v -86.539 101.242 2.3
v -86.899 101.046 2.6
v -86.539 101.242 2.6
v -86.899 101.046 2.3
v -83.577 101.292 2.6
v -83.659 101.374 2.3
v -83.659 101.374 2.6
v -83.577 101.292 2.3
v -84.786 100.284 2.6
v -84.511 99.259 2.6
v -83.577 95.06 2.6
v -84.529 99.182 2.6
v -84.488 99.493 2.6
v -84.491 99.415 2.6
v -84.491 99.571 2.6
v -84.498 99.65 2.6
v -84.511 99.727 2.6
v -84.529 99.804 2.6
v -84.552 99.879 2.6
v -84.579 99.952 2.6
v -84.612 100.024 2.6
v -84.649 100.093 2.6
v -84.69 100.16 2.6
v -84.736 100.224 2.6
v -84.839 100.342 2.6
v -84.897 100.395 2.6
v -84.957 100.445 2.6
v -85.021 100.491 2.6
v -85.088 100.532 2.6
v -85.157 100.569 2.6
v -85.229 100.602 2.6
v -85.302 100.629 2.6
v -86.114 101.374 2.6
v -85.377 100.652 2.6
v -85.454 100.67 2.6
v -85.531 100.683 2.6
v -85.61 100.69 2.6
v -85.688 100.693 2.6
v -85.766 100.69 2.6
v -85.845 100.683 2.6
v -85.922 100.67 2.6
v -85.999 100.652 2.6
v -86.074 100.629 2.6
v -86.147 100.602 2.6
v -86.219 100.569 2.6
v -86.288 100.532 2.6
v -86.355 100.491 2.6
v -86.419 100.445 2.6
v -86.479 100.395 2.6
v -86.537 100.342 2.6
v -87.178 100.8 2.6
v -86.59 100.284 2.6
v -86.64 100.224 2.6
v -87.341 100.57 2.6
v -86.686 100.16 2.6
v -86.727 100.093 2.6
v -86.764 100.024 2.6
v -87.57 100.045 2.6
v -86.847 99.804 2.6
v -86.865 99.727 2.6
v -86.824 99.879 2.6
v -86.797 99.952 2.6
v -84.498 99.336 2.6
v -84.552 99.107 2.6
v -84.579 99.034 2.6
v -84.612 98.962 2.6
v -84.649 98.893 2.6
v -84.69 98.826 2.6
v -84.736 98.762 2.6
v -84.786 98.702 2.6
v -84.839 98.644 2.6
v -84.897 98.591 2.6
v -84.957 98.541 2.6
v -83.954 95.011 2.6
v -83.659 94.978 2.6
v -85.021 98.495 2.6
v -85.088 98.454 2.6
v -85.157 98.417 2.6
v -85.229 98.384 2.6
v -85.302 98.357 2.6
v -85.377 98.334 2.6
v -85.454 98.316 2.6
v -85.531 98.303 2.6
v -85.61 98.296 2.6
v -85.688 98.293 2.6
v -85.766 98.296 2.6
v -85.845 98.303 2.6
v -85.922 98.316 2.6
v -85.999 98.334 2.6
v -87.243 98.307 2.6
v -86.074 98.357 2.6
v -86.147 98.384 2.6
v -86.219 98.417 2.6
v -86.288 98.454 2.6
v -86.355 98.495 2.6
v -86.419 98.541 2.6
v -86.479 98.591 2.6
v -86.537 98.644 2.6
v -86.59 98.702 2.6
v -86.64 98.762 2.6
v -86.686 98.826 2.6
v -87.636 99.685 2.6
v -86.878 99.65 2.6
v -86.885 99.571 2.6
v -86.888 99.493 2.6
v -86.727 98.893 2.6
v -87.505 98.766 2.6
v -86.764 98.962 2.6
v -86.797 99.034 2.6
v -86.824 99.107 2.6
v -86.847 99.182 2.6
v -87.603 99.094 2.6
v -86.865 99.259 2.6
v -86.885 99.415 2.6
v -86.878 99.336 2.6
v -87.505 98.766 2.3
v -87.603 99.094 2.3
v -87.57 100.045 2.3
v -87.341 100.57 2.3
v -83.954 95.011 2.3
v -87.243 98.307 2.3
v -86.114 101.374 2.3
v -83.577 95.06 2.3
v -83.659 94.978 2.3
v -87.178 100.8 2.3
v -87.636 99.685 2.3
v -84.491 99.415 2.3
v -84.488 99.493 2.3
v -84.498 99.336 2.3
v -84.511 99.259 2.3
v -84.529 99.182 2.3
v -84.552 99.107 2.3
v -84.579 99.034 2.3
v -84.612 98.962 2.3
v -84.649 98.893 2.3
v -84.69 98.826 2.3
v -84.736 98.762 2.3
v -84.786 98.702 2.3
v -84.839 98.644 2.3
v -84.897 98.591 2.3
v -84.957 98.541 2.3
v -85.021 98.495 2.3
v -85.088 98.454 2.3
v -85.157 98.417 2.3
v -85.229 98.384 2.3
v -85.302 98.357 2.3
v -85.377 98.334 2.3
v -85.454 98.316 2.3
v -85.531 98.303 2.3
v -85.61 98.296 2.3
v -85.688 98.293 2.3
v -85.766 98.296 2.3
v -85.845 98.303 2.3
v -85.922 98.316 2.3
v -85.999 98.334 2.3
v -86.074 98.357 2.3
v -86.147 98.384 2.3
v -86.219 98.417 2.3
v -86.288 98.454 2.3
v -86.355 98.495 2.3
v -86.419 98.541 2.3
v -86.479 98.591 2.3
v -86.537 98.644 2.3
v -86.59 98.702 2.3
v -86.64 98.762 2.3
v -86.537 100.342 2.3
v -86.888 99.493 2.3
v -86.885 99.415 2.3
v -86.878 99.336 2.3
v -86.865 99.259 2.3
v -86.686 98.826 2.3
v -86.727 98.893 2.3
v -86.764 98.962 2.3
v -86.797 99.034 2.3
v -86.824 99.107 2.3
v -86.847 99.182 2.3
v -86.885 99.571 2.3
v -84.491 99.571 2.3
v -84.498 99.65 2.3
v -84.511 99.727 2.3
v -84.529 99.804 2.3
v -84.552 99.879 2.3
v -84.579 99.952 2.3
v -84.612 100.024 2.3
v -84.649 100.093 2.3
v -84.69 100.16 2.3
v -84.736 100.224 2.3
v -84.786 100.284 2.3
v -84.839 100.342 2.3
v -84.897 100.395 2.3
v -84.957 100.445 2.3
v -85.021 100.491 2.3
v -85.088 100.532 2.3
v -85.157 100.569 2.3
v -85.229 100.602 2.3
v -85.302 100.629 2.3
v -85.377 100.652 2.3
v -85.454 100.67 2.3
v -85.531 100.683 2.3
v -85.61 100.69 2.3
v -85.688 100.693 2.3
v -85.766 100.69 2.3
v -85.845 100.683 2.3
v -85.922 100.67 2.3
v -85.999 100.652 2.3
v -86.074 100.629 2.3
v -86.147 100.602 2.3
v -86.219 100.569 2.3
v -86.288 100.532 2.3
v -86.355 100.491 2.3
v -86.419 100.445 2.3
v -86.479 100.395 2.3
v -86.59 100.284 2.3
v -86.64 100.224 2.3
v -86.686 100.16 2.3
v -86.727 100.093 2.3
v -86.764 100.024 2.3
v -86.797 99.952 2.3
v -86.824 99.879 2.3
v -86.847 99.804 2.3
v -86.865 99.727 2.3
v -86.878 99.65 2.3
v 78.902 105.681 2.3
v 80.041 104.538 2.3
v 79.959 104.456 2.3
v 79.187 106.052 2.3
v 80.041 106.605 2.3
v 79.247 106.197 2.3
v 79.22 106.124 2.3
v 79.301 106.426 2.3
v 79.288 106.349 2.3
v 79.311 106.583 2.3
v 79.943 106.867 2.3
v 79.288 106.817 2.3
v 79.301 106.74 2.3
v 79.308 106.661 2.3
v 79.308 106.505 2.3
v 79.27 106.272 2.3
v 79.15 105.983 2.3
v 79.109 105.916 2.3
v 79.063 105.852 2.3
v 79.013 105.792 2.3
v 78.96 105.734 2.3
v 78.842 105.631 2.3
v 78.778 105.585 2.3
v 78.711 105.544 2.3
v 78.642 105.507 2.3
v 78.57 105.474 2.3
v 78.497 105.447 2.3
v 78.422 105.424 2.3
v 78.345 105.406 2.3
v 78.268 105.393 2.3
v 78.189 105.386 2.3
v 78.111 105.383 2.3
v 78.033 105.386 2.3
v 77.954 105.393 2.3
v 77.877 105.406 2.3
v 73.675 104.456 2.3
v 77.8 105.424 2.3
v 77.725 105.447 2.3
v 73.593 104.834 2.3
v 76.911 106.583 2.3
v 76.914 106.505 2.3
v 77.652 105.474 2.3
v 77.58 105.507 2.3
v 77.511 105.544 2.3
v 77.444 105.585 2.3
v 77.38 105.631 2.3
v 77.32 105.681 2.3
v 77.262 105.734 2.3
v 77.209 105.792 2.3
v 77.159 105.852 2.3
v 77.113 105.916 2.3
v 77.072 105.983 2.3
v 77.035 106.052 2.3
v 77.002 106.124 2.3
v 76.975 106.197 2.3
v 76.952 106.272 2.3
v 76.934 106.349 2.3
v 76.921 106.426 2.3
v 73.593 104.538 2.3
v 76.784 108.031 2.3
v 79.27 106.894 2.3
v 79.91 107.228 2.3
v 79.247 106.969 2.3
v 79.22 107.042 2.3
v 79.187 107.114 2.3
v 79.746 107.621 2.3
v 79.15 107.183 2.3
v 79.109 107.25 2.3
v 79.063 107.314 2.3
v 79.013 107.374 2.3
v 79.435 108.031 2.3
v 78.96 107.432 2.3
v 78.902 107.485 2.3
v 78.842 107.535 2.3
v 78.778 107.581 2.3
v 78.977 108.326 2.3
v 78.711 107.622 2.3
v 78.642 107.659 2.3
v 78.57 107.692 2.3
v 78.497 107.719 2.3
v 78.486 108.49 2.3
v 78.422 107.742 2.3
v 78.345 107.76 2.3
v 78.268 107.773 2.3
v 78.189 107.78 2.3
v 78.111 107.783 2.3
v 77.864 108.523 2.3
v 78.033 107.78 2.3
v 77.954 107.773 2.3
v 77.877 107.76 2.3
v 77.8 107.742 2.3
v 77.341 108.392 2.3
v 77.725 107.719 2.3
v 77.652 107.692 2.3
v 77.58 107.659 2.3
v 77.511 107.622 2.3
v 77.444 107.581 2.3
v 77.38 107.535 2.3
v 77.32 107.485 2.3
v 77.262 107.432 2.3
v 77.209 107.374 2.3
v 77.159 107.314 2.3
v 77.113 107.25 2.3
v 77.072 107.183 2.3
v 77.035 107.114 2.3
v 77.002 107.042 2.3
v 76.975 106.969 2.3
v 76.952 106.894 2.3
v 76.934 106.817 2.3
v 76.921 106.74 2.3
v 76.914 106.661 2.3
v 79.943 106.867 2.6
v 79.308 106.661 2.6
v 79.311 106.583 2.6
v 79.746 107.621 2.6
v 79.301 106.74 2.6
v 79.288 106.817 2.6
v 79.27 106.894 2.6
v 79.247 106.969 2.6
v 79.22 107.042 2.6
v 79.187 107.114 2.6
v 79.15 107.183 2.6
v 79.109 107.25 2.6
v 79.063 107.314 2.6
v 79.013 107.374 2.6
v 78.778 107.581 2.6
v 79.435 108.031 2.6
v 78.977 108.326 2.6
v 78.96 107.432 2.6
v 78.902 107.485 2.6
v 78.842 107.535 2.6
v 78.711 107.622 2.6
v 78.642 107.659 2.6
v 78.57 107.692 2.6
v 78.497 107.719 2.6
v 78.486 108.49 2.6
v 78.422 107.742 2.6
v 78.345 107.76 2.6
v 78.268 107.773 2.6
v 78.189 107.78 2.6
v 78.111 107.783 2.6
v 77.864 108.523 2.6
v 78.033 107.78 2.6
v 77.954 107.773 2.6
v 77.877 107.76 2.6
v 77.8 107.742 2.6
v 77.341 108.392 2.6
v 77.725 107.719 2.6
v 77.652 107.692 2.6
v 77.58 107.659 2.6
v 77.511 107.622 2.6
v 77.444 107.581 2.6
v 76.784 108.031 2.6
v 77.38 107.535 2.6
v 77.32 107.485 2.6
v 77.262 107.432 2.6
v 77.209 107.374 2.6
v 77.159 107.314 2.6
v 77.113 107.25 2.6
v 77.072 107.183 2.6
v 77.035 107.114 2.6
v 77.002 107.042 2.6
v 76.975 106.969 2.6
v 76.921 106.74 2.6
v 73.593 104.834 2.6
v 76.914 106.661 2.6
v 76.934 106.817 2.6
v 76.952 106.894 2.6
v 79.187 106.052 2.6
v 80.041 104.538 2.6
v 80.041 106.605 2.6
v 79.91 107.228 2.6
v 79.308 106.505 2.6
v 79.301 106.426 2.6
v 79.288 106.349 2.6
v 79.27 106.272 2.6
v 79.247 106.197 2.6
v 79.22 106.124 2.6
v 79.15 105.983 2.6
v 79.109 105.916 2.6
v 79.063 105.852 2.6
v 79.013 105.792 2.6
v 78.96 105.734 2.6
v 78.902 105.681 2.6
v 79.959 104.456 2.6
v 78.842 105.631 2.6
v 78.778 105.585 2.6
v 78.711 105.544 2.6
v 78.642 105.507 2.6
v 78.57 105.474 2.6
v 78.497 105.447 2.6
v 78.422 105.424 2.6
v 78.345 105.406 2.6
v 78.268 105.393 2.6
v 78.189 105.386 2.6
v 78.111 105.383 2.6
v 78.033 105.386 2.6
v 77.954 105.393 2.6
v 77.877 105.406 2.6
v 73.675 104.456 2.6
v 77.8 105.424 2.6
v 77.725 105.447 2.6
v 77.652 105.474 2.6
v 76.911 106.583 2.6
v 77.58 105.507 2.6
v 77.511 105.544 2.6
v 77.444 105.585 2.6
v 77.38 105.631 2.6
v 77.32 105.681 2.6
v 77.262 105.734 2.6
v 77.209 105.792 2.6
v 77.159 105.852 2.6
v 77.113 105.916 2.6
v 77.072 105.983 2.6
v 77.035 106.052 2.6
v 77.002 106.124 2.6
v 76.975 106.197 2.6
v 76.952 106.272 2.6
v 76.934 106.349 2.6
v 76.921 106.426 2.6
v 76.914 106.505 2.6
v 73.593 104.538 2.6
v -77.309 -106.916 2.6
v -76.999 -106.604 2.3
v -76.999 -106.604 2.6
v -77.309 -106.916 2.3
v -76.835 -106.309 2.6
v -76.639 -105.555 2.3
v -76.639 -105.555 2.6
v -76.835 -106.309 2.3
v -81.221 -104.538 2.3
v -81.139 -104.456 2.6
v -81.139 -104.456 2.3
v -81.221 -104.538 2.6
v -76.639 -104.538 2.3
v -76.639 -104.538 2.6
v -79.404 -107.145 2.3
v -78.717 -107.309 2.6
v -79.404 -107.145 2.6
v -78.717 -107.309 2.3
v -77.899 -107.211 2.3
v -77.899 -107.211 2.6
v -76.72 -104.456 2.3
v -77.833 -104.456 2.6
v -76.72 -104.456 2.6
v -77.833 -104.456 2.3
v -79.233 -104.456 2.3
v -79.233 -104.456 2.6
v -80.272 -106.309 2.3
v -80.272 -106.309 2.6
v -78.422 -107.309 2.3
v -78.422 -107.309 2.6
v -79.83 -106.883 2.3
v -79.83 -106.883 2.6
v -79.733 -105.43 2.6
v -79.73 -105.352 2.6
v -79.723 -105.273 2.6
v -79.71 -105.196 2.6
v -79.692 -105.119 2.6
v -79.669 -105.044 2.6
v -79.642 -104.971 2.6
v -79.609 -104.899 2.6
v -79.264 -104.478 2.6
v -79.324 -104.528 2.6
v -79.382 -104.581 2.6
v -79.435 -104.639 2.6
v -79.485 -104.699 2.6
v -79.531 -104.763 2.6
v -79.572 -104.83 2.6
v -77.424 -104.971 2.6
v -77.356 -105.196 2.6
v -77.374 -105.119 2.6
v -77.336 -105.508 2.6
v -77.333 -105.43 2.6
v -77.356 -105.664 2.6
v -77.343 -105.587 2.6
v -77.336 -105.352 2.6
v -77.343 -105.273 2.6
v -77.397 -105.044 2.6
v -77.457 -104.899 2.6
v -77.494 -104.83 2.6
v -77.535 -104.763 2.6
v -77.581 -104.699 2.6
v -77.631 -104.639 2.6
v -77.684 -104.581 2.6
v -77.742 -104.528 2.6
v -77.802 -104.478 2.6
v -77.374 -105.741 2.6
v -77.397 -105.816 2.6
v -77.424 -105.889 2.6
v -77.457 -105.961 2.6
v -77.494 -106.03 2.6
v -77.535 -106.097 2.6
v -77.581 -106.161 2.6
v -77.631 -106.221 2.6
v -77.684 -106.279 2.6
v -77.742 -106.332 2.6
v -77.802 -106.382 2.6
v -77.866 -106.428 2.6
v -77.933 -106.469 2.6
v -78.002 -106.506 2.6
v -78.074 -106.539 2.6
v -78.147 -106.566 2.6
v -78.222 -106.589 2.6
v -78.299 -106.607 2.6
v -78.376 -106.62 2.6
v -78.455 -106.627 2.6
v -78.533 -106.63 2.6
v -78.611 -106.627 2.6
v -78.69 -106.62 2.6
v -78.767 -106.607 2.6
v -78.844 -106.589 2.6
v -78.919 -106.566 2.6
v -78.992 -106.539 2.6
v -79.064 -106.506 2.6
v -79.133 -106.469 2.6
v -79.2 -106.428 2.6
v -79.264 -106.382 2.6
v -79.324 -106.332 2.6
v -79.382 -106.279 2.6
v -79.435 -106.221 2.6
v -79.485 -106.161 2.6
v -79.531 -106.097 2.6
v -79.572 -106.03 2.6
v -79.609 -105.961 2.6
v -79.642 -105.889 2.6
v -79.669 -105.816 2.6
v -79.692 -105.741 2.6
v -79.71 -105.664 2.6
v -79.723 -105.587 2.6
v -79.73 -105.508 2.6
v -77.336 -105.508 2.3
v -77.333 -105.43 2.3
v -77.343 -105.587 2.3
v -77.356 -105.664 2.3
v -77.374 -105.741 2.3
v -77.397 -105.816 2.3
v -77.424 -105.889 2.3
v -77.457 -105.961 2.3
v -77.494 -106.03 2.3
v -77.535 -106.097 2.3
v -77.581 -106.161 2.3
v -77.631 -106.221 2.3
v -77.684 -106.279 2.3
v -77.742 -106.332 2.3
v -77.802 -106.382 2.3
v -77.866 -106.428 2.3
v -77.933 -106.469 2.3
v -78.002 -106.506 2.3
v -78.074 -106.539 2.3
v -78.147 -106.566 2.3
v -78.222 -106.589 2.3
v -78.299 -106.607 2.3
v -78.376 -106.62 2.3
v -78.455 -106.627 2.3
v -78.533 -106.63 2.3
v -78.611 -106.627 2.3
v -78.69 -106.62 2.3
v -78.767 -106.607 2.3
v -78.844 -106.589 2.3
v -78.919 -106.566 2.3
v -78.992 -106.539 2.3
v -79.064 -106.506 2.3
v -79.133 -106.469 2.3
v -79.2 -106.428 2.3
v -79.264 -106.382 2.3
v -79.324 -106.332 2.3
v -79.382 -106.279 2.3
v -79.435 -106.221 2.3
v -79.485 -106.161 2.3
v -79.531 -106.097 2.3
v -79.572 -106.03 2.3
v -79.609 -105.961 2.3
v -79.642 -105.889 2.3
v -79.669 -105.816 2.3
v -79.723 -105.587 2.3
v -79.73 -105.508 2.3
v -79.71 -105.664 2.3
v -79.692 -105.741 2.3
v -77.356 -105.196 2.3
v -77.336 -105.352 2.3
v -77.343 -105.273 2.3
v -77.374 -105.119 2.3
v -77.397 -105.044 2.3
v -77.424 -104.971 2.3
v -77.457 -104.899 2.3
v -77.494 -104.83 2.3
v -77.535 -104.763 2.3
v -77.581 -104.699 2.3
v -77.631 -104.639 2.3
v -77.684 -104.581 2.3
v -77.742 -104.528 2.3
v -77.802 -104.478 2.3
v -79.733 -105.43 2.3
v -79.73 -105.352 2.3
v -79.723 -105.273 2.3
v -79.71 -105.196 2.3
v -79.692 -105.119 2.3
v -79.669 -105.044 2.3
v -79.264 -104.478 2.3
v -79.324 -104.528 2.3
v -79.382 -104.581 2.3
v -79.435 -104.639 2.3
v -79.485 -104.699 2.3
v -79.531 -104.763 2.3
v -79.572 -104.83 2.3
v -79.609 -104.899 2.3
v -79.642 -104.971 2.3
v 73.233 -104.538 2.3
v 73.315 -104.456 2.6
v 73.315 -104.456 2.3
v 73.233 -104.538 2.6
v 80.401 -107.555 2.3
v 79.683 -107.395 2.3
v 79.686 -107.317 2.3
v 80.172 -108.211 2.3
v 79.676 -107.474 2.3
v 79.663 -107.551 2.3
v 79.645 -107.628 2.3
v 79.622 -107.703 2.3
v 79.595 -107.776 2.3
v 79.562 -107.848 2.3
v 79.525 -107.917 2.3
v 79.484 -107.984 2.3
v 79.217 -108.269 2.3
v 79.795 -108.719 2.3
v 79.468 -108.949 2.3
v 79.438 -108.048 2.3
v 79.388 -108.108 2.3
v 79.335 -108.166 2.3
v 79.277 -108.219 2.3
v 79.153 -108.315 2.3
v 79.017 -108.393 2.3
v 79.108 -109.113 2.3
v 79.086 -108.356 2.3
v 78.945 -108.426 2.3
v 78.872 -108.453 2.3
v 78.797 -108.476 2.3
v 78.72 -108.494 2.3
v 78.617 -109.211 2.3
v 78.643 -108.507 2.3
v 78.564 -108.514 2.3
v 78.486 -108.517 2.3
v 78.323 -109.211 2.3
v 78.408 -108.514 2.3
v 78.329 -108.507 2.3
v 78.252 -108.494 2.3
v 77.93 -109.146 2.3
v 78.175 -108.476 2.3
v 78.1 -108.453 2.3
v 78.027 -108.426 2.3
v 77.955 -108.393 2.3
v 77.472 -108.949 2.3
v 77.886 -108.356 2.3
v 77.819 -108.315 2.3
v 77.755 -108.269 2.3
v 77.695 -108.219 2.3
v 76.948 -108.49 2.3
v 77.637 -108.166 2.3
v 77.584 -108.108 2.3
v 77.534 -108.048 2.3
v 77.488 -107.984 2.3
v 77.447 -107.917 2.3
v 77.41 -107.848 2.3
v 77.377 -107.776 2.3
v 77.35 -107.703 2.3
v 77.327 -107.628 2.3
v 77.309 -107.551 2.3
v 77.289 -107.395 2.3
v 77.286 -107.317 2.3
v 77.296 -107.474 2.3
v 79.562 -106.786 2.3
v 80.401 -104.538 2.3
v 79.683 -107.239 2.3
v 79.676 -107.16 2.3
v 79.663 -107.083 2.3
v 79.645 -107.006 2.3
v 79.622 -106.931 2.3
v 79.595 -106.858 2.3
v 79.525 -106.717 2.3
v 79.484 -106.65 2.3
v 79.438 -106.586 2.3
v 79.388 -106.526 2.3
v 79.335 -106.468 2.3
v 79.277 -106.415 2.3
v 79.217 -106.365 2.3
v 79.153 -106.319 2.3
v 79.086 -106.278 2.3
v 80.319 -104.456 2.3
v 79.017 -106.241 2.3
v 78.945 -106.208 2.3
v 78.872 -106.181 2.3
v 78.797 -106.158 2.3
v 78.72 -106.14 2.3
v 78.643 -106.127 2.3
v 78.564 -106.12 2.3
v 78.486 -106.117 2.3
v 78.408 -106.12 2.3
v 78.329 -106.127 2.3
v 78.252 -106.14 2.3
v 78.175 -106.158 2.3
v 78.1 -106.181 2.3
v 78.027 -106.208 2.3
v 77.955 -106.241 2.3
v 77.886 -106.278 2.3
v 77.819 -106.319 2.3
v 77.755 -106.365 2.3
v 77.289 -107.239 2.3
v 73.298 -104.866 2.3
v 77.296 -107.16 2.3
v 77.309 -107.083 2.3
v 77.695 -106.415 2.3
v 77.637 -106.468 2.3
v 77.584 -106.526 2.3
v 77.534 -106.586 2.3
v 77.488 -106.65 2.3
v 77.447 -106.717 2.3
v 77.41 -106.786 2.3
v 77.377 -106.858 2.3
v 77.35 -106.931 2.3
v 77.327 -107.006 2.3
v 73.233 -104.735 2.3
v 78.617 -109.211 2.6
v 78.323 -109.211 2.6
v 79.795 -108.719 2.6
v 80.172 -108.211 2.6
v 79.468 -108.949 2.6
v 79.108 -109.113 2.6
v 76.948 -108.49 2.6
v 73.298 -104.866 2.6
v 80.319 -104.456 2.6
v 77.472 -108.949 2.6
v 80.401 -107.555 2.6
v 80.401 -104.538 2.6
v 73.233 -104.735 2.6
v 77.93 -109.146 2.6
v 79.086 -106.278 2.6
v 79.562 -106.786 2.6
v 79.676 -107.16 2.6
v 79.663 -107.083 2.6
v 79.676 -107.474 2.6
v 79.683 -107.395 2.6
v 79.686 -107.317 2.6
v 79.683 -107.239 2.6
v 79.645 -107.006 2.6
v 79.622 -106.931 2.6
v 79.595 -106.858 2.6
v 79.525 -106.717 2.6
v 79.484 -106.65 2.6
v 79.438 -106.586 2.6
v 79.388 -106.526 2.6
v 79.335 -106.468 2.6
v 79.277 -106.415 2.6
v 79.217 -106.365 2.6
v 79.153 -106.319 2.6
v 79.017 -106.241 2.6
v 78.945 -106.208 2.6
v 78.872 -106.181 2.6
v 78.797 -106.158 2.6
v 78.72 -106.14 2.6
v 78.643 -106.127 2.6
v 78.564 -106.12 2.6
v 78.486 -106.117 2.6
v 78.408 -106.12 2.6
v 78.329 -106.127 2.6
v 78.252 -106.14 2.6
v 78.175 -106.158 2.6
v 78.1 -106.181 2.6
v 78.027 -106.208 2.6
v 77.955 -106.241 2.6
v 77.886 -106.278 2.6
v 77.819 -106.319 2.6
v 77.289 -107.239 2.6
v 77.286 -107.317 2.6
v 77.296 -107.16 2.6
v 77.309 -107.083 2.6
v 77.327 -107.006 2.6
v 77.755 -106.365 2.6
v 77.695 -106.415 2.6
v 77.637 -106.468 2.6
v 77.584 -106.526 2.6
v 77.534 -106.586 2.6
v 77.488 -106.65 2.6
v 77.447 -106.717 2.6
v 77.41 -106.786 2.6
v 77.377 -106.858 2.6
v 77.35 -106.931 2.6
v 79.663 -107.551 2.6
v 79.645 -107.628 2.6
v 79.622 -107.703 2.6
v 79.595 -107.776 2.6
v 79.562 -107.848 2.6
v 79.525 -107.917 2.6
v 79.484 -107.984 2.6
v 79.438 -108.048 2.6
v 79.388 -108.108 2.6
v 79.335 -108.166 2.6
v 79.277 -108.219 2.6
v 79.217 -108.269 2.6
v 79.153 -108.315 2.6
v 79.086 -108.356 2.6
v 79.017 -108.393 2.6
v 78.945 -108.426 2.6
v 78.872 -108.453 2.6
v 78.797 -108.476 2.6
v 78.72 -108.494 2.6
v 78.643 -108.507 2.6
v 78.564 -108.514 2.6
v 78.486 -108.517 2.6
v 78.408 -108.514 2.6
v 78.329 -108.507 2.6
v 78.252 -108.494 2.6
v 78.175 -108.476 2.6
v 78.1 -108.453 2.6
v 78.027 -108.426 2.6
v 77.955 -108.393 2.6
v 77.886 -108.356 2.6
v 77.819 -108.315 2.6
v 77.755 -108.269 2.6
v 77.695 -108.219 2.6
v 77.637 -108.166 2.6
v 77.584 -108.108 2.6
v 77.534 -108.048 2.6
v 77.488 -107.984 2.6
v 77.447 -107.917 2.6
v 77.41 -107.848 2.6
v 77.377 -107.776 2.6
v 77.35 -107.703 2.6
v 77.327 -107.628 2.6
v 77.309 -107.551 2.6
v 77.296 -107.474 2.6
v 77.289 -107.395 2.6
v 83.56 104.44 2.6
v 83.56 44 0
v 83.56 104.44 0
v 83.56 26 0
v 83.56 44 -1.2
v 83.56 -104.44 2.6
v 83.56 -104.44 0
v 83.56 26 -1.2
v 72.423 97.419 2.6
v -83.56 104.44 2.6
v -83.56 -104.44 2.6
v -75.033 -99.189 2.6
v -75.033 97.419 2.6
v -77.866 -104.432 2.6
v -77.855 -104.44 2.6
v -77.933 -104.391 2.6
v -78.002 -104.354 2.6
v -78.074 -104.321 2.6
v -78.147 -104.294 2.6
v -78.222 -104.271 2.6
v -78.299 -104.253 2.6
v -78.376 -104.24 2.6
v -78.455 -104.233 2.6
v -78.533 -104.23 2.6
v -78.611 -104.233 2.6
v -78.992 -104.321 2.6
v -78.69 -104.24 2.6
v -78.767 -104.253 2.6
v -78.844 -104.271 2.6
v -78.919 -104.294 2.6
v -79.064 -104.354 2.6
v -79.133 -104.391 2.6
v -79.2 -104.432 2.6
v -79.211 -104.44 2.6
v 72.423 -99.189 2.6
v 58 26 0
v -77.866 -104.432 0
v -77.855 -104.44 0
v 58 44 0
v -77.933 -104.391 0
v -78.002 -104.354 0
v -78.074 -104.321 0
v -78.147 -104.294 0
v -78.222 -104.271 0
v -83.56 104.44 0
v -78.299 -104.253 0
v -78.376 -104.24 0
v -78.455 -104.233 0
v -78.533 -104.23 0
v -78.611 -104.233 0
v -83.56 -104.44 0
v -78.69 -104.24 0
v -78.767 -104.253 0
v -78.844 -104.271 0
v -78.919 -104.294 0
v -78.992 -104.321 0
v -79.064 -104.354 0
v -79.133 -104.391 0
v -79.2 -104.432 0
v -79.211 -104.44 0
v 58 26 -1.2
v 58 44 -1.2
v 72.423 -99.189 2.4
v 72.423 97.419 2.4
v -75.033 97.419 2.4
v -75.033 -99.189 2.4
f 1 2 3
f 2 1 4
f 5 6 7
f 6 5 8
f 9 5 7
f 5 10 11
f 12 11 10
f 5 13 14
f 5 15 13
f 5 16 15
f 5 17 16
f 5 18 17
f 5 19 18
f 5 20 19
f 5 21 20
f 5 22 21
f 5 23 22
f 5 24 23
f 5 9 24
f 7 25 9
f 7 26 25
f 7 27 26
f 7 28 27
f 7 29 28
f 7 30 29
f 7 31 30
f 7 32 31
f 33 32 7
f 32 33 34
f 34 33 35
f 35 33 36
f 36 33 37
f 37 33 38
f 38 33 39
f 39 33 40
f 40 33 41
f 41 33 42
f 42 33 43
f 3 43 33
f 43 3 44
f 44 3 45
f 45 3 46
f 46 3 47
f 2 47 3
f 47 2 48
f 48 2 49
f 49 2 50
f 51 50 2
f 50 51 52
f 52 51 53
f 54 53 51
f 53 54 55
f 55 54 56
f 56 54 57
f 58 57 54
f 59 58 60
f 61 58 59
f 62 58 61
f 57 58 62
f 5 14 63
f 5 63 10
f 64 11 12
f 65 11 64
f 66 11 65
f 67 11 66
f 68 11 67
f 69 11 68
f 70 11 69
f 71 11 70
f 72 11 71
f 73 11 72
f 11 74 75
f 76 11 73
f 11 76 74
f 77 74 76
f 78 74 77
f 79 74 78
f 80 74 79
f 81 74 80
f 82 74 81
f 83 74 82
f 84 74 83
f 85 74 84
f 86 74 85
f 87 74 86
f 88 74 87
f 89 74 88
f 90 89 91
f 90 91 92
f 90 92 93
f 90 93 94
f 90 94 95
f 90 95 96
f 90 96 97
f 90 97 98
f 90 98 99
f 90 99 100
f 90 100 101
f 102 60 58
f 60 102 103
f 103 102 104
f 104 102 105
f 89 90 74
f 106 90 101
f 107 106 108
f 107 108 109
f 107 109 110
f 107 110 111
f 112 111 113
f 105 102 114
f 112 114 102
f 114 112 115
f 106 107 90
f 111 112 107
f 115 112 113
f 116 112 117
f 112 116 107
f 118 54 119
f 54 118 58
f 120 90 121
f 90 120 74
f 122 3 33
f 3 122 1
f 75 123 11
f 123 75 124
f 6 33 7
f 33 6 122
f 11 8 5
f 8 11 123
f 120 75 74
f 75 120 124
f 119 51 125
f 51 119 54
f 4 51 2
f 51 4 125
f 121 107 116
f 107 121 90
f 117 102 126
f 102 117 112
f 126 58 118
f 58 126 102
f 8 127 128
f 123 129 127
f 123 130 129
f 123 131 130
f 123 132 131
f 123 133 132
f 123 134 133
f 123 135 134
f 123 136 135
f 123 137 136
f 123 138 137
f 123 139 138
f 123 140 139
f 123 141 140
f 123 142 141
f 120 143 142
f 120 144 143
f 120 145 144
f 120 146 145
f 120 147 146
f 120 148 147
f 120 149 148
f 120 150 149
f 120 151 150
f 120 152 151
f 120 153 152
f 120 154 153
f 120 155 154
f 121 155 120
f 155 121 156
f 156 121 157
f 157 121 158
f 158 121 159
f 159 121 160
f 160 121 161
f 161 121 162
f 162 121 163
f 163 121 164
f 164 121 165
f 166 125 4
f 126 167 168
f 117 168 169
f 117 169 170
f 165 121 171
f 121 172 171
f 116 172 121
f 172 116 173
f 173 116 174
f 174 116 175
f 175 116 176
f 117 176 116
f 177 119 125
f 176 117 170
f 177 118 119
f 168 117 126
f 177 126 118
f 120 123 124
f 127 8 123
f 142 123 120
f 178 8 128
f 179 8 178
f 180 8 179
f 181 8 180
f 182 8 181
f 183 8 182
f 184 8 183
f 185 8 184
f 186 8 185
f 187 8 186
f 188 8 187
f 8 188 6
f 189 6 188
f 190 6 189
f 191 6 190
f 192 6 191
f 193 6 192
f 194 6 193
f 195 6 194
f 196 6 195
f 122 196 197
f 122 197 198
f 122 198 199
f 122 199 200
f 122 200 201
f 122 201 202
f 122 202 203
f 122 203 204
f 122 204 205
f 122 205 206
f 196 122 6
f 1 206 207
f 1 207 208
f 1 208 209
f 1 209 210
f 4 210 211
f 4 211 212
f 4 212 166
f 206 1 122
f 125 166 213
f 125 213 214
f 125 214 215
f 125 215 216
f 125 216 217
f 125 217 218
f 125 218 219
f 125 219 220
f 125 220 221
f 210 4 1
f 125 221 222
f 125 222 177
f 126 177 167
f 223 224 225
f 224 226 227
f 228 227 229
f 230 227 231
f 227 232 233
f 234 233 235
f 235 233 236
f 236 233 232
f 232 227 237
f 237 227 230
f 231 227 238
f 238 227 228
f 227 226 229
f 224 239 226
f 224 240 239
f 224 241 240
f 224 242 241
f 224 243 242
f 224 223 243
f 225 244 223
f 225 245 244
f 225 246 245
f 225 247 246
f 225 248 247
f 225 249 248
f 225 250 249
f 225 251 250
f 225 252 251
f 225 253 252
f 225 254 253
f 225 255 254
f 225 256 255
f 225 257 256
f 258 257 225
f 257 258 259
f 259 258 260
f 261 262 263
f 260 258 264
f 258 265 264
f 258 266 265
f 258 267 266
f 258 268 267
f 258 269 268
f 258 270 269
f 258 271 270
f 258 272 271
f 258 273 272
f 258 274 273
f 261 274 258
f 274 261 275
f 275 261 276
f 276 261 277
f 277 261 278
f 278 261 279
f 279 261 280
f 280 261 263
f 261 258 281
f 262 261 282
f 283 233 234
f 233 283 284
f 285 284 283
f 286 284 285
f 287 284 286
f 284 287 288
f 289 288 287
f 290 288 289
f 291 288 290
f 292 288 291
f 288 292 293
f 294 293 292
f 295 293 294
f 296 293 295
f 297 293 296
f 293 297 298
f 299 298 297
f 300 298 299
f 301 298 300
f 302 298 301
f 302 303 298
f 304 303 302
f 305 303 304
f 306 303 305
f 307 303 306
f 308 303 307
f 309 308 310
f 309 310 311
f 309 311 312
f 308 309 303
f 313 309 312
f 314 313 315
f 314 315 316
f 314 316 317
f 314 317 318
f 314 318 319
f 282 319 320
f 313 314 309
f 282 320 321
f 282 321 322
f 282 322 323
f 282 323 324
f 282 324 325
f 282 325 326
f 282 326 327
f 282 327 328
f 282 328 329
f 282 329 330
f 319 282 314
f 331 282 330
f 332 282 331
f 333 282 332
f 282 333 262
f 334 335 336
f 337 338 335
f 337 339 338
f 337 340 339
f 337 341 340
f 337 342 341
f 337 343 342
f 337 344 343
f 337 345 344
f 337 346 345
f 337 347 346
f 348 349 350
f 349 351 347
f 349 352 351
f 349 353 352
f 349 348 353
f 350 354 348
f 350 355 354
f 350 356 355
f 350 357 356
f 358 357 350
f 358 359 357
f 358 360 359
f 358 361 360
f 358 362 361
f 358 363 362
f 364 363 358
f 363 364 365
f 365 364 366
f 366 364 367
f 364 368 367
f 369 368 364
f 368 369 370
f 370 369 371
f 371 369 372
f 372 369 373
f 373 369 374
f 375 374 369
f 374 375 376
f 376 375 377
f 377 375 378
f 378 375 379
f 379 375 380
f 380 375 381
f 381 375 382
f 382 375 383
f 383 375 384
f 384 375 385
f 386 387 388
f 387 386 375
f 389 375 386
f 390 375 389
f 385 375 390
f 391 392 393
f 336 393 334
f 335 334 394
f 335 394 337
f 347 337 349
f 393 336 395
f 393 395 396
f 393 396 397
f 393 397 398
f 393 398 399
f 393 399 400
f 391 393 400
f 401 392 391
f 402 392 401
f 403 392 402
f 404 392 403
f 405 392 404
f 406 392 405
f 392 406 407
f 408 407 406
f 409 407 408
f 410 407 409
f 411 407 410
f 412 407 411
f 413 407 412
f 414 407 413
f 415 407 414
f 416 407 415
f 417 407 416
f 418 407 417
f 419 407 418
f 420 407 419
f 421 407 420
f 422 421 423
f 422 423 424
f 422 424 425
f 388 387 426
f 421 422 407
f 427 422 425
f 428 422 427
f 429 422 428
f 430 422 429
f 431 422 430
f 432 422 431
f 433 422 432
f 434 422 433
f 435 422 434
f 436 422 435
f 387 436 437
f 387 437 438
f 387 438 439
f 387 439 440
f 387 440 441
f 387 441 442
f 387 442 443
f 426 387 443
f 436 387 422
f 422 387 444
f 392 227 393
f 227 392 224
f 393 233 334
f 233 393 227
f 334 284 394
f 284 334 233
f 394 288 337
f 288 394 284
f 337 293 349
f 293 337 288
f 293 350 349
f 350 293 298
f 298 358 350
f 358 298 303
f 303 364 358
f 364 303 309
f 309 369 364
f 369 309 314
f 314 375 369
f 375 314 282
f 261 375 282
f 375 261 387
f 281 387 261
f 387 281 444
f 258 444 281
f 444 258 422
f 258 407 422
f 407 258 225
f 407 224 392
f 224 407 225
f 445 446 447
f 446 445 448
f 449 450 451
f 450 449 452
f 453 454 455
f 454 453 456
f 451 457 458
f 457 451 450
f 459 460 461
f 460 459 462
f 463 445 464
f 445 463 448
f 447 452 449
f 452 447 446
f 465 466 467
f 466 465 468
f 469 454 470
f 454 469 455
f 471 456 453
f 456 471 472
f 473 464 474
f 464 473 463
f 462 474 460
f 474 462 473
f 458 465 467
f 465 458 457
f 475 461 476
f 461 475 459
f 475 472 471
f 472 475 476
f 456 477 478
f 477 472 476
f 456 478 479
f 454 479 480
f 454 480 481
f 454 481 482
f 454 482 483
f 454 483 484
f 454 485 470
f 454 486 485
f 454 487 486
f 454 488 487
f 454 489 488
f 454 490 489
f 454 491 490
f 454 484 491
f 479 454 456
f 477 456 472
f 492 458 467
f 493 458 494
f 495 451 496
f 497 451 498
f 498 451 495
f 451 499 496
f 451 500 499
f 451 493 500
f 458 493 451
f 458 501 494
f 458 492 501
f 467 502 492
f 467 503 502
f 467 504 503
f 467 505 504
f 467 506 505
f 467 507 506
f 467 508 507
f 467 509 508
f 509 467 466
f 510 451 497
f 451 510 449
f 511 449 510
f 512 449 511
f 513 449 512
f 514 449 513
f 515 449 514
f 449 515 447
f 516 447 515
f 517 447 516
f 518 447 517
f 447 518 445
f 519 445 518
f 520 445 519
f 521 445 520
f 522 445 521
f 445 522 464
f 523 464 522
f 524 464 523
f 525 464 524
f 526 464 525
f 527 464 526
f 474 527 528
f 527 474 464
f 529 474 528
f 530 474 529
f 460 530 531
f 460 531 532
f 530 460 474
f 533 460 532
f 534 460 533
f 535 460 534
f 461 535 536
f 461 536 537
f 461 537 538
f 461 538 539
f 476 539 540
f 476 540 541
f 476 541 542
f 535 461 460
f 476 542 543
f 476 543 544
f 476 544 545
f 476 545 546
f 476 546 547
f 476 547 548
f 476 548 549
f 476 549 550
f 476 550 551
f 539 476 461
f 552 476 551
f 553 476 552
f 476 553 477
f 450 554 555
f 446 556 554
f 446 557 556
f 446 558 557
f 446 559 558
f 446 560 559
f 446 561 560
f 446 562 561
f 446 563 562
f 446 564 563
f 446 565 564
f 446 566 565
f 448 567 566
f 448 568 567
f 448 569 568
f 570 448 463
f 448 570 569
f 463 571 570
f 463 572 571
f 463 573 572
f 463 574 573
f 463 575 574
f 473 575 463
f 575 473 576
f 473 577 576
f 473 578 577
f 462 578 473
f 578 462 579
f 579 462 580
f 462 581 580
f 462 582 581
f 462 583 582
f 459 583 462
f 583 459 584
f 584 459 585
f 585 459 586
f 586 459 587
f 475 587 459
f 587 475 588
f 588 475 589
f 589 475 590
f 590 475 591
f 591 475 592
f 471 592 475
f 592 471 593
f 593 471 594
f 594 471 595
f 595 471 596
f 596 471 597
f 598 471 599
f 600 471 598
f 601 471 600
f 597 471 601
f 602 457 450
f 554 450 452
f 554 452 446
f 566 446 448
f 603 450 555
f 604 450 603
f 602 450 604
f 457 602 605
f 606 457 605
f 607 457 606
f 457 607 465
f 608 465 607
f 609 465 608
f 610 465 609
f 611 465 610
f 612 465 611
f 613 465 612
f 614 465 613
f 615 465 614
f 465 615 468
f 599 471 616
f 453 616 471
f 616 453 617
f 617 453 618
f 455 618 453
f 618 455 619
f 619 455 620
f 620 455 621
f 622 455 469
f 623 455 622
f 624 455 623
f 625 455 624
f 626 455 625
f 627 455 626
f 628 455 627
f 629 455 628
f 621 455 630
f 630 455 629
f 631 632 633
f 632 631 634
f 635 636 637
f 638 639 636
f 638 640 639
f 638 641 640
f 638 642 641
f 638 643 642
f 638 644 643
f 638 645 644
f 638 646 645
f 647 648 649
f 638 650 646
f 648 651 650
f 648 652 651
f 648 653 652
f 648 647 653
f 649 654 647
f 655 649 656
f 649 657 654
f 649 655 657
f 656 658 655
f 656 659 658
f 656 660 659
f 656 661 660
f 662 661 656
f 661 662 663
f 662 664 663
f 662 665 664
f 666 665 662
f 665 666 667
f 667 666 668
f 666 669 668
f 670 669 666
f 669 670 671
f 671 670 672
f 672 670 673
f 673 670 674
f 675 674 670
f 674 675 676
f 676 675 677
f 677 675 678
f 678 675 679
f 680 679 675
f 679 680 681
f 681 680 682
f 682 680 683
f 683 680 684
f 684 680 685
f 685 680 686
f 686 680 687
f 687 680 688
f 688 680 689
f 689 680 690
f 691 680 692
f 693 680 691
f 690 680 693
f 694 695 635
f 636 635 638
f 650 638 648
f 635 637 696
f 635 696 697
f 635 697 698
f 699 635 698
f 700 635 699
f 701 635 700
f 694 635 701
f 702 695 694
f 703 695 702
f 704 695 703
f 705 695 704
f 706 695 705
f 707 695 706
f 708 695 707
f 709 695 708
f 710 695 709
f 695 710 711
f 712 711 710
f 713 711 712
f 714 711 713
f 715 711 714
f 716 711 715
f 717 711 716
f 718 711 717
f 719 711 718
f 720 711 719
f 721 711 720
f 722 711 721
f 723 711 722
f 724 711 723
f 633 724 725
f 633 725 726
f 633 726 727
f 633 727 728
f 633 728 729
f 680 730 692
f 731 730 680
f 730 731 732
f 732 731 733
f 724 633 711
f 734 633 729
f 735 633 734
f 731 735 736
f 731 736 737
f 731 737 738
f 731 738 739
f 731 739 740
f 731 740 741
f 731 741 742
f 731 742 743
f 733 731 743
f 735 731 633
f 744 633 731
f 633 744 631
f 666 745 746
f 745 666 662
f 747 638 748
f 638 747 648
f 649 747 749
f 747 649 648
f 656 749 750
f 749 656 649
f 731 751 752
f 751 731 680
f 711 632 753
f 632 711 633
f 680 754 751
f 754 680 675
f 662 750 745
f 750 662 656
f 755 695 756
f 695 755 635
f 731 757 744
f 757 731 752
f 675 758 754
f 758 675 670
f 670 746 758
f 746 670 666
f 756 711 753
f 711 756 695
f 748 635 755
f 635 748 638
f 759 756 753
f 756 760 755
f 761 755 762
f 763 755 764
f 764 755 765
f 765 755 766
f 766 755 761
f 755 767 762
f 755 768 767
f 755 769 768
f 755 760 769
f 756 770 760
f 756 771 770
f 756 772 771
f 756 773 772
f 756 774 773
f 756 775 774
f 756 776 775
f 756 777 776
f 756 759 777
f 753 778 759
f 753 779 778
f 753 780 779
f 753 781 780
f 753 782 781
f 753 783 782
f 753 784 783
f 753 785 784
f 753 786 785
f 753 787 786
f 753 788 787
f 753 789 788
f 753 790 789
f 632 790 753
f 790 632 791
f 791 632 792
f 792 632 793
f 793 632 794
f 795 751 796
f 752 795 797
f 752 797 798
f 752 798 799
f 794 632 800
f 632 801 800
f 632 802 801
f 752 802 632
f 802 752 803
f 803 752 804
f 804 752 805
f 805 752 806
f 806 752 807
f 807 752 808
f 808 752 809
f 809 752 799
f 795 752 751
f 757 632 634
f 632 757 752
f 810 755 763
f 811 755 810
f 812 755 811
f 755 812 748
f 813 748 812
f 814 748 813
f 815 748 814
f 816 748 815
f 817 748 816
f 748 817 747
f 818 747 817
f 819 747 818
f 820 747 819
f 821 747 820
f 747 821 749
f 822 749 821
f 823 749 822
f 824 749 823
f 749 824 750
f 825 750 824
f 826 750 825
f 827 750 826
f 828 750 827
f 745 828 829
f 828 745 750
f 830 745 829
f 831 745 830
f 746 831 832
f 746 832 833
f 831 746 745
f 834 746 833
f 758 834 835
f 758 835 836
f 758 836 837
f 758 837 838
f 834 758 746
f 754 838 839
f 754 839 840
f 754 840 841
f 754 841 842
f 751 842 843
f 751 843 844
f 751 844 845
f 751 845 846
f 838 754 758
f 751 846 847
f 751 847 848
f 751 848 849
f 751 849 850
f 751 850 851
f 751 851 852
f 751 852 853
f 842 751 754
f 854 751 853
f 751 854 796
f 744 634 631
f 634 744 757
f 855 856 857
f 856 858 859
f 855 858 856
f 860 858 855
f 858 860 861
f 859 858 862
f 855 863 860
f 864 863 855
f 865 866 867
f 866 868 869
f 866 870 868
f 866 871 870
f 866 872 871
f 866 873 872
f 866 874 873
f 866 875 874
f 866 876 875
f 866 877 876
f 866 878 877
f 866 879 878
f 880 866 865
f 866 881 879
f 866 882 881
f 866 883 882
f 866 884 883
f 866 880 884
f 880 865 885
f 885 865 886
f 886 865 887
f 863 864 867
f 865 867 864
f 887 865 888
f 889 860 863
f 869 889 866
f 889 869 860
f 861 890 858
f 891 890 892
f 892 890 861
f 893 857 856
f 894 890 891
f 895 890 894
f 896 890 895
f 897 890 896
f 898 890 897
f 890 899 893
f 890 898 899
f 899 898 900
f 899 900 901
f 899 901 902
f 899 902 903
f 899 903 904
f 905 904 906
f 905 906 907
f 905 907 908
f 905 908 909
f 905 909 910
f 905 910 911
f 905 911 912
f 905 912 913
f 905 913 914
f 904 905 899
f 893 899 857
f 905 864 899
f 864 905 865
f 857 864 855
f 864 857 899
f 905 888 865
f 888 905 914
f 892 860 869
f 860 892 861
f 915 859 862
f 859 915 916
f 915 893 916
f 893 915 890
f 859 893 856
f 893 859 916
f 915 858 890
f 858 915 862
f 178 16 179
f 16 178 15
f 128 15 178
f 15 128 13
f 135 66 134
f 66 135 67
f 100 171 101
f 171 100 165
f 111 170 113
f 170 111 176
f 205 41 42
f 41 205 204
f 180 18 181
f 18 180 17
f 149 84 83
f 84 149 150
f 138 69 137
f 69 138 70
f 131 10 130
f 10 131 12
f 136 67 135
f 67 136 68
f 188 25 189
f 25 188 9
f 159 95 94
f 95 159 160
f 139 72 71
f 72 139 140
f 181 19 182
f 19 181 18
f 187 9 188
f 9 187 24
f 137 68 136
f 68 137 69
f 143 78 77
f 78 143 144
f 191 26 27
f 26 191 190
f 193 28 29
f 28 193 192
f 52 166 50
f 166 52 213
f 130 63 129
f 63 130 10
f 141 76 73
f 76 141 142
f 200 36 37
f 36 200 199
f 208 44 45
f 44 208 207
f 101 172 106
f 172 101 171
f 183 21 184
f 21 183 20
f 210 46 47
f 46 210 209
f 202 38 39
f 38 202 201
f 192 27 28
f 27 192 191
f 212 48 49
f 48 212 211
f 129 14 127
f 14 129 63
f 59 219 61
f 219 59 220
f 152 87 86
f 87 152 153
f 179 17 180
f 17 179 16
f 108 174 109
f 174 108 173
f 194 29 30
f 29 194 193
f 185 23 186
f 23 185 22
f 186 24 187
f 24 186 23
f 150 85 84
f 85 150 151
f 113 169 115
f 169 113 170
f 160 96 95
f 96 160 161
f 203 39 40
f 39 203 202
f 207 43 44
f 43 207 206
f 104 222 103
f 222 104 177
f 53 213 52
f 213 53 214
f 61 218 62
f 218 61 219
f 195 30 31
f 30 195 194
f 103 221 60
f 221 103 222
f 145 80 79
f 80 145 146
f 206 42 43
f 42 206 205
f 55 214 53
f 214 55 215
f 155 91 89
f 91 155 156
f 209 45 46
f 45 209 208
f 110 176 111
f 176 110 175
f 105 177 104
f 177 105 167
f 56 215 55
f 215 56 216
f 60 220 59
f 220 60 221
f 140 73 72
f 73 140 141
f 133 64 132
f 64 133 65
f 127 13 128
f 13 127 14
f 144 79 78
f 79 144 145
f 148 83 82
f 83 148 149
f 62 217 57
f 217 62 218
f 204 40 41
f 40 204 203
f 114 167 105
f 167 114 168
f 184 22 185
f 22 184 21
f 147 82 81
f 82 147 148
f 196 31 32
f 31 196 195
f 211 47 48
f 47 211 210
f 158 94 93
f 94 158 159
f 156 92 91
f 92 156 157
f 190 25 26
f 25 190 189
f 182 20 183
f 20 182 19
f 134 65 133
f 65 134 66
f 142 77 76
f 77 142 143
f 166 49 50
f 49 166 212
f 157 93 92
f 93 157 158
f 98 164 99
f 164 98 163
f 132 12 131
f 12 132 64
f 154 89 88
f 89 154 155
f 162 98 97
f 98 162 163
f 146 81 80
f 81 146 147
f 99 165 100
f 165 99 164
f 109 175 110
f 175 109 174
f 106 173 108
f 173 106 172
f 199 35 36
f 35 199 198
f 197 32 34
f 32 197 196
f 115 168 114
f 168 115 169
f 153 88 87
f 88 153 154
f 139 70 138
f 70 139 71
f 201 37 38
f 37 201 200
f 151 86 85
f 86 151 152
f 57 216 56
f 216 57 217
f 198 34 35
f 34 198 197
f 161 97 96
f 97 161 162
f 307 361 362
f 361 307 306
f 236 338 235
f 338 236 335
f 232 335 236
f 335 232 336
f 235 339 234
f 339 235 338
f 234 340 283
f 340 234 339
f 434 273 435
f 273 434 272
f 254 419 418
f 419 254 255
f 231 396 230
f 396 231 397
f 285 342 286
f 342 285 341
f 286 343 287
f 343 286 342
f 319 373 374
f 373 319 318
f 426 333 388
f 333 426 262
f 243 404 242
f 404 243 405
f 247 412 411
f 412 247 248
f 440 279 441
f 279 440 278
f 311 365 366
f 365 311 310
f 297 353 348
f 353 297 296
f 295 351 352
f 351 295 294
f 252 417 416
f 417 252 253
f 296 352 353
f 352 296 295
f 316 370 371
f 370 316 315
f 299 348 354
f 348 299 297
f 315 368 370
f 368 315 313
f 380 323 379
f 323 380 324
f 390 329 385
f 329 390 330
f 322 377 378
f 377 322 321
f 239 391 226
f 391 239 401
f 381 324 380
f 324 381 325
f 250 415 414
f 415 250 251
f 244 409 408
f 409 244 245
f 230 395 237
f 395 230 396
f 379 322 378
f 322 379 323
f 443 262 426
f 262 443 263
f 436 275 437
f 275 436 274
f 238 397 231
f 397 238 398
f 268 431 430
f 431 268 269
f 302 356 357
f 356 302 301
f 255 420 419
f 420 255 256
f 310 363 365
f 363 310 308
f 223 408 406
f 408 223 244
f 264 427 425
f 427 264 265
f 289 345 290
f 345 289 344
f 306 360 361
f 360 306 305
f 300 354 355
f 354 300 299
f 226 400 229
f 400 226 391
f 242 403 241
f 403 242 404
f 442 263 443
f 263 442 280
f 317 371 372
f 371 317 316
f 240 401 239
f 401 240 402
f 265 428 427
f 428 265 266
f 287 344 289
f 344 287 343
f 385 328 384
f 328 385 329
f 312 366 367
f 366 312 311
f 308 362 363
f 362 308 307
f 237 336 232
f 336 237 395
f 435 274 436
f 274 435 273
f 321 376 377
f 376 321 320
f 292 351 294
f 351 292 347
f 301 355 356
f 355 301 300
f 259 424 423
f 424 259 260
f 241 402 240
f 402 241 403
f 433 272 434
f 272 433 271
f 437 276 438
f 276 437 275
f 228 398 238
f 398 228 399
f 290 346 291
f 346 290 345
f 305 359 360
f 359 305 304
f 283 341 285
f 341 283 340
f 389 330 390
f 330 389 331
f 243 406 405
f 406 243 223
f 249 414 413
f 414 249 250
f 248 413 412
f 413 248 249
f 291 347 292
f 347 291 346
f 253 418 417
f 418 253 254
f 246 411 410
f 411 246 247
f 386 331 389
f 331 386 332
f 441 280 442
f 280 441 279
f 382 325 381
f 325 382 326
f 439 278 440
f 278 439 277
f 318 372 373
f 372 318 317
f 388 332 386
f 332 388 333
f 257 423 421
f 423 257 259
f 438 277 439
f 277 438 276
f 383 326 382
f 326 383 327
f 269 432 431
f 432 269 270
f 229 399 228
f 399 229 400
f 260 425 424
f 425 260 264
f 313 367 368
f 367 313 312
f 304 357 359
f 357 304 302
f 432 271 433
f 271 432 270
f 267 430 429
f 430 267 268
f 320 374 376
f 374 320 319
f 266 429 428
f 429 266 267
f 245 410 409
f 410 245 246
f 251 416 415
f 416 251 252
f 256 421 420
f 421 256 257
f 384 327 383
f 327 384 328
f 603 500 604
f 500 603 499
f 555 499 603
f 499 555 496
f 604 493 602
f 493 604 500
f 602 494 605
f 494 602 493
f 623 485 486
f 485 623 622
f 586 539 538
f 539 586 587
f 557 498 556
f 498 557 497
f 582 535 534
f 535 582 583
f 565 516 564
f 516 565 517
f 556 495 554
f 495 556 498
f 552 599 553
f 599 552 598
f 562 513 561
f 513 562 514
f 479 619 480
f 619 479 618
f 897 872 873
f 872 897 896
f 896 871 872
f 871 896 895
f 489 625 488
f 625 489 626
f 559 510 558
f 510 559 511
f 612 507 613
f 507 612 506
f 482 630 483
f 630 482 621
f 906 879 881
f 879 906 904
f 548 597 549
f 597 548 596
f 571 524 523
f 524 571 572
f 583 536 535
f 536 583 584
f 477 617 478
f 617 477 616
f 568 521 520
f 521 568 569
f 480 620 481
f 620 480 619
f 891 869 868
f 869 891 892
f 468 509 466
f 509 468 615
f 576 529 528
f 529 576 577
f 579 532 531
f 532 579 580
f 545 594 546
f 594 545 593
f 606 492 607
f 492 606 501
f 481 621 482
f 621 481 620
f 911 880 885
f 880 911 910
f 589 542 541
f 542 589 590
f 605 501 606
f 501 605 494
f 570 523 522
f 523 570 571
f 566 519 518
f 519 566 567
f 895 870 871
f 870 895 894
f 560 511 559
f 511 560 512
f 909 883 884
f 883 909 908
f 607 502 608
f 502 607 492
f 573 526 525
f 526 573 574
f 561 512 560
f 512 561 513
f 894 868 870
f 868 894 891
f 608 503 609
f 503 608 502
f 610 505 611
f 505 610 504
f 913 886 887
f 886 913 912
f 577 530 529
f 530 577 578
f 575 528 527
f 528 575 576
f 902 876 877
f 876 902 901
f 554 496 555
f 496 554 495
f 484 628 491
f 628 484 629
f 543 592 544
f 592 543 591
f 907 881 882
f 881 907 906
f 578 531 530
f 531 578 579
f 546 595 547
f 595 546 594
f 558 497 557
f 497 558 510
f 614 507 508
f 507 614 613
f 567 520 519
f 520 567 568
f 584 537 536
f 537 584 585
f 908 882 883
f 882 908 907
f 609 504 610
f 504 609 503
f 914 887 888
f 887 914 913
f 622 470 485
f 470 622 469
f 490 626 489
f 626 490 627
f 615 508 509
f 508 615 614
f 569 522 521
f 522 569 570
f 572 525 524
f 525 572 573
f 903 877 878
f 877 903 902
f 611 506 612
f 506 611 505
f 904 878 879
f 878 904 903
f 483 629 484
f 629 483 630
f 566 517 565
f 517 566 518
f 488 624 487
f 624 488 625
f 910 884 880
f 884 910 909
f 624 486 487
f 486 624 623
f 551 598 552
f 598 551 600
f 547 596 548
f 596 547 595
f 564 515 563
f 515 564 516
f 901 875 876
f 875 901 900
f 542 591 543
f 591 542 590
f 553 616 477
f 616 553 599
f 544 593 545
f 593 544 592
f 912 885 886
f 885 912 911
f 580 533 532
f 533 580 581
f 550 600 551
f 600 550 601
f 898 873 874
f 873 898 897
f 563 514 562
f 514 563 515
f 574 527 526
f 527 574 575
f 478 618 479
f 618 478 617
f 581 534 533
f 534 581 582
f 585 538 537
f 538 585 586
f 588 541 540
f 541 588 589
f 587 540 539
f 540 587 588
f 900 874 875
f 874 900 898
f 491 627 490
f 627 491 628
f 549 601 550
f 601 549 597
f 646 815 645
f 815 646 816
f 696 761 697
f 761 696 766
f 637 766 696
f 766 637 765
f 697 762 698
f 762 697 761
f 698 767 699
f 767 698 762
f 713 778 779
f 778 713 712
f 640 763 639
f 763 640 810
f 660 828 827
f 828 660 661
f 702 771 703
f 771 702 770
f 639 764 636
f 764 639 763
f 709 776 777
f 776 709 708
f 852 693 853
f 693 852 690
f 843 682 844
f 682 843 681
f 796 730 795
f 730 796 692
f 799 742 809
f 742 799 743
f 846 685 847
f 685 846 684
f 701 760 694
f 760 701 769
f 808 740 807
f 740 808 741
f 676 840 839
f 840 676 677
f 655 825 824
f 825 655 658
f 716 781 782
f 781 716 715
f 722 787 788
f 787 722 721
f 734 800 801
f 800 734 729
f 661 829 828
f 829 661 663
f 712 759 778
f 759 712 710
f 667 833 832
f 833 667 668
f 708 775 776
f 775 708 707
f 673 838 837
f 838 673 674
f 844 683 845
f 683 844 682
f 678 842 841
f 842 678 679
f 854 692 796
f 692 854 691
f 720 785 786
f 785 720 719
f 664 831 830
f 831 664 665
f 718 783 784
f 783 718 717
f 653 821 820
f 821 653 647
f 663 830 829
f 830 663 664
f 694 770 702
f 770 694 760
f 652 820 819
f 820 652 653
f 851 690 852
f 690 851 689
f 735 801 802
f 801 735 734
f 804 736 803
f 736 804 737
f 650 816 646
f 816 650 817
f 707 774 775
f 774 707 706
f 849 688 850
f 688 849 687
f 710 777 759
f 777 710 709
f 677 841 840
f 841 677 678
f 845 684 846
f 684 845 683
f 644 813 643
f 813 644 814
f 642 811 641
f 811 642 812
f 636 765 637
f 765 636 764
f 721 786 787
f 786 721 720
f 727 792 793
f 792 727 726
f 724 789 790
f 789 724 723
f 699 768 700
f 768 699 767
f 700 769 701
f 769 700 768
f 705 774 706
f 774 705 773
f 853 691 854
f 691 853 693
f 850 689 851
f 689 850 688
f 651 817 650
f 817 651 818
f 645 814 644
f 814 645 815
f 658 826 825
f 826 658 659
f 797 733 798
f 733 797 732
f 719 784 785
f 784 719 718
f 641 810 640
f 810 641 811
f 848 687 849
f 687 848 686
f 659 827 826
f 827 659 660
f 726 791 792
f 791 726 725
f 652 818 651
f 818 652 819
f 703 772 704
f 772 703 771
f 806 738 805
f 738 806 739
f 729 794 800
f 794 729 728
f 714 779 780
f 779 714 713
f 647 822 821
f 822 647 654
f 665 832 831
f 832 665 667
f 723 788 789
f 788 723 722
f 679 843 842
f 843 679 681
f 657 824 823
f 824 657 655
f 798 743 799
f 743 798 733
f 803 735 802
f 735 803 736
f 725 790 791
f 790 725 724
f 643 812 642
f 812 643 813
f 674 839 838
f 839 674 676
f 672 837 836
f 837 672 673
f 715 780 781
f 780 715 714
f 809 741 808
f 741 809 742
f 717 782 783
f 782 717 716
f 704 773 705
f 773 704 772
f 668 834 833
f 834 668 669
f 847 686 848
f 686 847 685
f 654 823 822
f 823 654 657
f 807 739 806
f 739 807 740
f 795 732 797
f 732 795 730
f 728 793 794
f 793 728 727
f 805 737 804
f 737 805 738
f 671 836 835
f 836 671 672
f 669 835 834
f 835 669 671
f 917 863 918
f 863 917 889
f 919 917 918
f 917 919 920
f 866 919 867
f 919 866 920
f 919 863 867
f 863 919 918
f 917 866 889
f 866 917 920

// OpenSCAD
// LP097QX1-SPC1 LCD module envelope for case-mount design.
// Lugs = thin flat sheet-metal tabs, ALL on the FRONT (screen) plane (user-confirmed).
// Rear FPC connector keep-out on the RIGHT long edge (approx). Datum: outline CENTER, Z=0 rear.
OUT_W=167.12; OUT_H=208.88; TH=2.60; HOLE_D=2.40; LUG_T=0.3;
ACT_W=147.456; ACT_H=196.608; ACT_CX=-1.305; ACT_CY=-0.885; ACT_D=0.20;
CONN=[58.0,83.56,26.0,44.0]; CONN_D=1.2;   // [x0,x1,y0,y1] rear bump, depth behind rear
HOLES=[[-85.688,99.493],[78.111,106.583],[-78.533,-105.430],[78.486,-107.317]];
EARS=[
  [[-86.114,101.374],[-83.659,101.374],[-83.577,101.292],[-83.577,95.060],[-83.659,94.978],[-83.954,95.011],[-87.243,98.307],[-87.505,98.766],[-87.603,99.094],[-87.636,99.685],[-87.570,100.045],[-87.341,100.570],[-87.178,100.800],[-86.899,101.046],[-86.539,101.242]],
  [[77.864,108.523],[78.486,108.490],[78.977,108.326],[79.435,108.031],[79.746,107.621],[79.910,107.228],[79.943,106.867],[80.041,106.605],[80.041,104.538],[79.959,104.456],[73.675,104.456],[73.593,104.538],[73.593,104.834],[76.784,108.031],[77.341,108.392]],
  [[-81.139,-104.456],[-76.720,-104.456],[-76.639,-104.538],[-76.639,-105.555],[-76.835,-106.309],[-76.999,-106.604],[-77.309,-106.916],[-77.899,-107.211],[-78.422,-107.309],[-78.717,-107.309],[-79.404,-107.145],[-79.830,-106.883],[-80.272,-106.309],[-81.221,-104.538]],
  [[73.315,-104.456],[80.319,-104.456],[80.401,-104.538],[80.401,-107.555],[80.172,-108.211],[79.795,-108.719],[79.468,-108.949],[79.108,-109.113],[78.617,-109.211],[78.323,-109.211],[77.930,-109.146],[77.472,-108.949],[76.948,-108.490],[73.298,-104.866],[73.233,-104.735],[73.233,-104.538]]
];
$fn=96;
difference() {
  union() {
    translate([-OUT_W/2,-OUT_H/2,0]) cube([OUT_W,OUT_H,TH]);
    for (p=EARS) translate([0,0,TH-LUG_T]) linear_extrude(LUG_T) polygon(p);
    translate([CONN[0],CONN[2],-CONN_D]) cube([CONN[1]-CONN[0],CONN[3]-CONN[2],CONN_D+0.2]); // FPC connector
  }
  for (h=HOLES) translate([h[0],h[1],-CONN_D-1]) cylinder(d=HOLE_D,h=TH+CONN_D+2);
  translate([ACT_CX-ACT_W/2,ACT_CY-ACT_H/2,TH-ACT_D]) cube([ACT_W,ACT_H,ACT_D+1]);
}
